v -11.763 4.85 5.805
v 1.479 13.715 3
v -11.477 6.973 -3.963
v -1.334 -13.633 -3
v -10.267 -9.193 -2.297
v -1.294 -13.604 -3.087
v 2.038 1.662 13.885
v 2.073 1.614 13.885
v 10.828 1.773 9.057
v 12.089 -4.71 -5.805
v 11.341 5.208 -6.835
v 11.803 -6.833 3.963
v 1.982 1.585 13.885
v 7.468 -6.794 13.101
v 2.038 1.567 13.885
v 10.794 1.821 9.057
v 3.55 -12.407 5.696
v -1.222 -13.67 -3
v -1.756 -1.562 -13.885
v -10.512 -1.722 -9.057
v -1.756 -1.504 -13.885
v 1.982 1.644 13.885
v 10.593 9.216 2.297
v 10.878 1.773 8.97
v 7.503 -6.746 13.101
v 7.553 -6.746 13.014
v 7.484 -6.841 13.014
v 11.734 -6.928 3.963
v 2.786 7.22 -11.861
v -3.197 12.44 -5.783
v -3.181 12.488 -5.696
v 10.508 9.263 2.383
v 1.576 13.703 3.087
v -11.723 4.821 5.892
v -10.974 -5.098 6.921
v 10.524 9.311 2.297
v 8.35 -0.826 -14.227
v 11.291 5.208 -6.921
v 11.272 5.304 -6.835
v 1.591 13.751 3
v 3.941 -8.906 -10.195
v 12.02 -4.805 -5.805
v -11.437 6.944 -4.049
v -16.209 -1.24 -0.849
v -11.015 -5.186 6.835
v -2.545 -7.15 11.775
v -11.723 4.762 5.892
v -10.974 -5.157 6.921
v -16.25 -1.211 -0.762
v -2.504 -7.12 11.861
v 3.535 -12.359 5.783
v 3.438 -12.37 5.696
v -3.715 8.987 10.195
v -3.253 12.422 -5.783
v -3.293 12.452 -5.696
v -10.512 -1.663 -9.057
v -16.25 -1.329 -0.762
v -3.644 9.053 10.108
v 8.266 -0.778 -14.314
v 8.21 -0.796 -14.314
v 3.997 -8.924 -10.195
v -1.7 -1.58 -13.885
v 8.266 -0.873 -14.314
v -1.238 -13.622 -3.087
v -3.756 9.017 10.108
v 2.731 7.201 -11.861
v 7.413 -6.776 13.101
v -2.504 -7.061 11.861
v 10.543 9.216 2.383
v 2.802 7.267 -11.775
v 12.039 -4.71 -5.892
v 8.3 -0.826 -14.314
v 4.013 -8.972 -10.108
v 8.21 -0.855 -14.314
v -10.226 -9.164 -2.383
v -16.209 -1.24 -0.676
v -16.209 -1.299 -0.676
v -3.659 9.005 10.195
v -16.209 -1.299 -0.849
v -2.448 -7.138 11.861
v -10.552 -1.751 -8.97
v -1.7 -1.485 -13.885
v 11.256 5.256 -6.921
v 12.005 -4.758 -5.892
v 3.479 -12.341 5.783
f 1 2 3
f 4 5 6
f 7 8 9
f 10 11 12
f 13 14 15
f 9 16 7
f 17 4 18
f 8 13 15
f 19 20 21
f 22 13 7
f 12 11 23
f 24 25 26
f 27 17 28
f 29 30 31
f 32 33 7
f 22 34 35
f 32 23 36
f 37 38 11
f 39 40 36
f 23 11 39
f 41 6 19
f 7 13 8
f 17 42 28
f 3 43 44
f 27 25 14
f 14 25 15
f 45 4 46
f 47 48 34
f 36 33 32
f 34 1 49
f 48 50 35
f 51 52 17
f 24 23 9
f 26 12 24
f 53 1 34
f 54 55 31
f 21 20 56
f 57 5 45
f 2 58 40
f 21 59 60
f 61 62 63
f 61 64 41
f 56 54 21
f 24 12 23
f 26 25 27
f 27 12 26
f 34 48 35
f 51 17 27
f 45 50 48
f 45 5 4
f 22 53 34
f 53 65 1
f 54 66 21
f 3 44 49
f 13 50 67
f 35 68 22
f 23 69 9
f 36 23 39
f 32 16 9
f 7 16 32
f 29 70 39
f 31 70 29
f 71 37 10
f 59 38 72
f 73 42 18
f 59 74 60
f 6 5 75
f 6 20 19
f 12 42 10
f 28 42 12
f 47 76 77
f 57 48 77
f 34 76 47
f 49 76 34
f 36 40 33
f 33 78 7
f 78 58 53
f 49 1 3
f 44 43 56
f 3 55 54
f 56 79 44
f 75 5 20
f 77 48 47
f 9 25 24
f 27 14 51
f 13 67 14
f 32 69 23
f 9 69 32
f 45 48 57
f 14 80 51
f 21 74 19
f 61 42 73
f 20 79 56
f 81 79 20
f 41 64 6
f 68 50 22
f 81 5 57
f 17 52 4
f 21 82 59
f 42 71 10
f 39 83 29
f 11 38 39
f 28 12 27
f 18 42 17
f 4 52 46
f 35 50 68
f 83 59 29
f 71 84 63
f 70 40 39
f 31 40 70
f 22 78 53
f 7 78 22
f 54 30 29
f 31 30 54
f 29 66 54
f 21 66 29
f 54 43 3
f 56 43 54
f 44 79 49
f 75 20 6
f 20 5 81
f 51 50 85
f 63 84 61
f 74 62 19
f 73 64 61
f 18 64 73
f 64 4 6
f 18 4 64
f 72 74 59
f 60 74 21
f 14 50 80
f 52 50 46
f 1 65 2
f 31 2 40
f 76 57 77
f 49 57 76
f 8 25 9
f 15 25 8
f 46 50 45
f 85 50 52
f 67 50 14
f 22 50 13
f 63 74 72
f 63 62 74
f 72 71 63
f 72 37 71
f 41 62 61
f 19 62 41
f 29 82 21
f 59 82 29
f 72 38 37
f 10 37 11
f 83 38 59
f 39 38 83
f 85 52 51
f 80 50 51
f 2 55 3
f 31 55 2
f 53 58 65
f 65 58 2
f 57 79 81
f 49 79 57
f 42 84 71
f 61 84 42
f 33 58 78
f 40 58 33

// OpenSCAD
// Auto-generated OpenSCAD file

    inner_points = 10*[[-0.12531678041950284, -1.3574519535518534, -0.3000260109199145], [-0.36746057341550314, 0.8957867730802842, 1.0108452987700864], [0.3981645779138779, -0.8876613539251546, -1.0108452987700864], [0.15602078491787758, 1.3655773727069829, 0.3000260109199145], [1.1703376344459069, -0.6833157024764185, 0.39628853077487575], [1.0778469356862532, 0.17734490632952513, 0.8969968161993667], [-1.0471429311878786, -0.16921948717439553, -0.8969968161993667], [-1.1396336299475323, 0.6914411216315481, -0.39628853077487575], [-0.2463928887078073, -0.7090848095102253, 1.1774700504213524], [1.1240990998859461, 0.520842947907666, -0.6834790050293927], [-1.0933950953875715, -0.5127175287525364, 0.6834790050293927], [0.277096893206182, 0.717210228665355, -1.1774700504213524], [0.3519124137141851, -1.2311593955032956, 0.5696305224586731], [0.20225931947783818, 0.16141872232289847, 1.379793546724183], [1.198923043974558, -0.47102223771210283, -0.5804992451419002], [1.0492699497382112, 0.9215558801140912, 0.2296637791236098], [-1.0185659452398366, -0.9134304609589615, -0.2296637791236098], [-1.1682190394761833, 0.4791476568672325, 0.5804992451419002], [-0.17155531497946344, -0.15329330316776887, -1.379793546724183], [-0.32120840921581034, 1.239284814658425, -0.5696305224586731], [0.7452968962209774, -0.6746243016514798, 1.3014210240601998], [-1.6168689194414103, -0.1269845502290076, -0.0762480675498447], [0.8250174408462159, -0.08256874217359109, -1.4226978450891705]];

    outer_points = 10*[[-0.4278051408840869, 1.2127161463312635, -0.5566217759152233], [-0.17380580954418245, -1.3719247336384077, -0.2261405699168037], [0.17380580954418245, 1.3719247336384077, 0.2261405699168037], [0.4278051408840869, -1.2127161463312635, 0.5566217759152233], [0.9893779464124436, 0.49362248371798856, -0.8608098595411191], [1.0863970578645408, -0.49362248371798856, -0.7345772714927785], [-1.0863970578645408, 0.49362248371798856, 0.7345772714927785], [-0.9893779464124436, -0.49362248371798856, 0.8608098595411191], [-0.3910812087944938, -0.20840674643547916, -1.3293410426713064], [1.1839567074308435, 0.20840674643547916, 0.7199573838305398], [-1.1839567074308435, -0.20840674643547916, -0.7199573838305398], [0.3910812087944938, 0.20840674643547916, 1.3293410426713064], [0.07624615997787965, 0.6698955034849399, -1.2283940854065145], [0.233226379865687, -0.9275004090487542, -1.0241454674564356], [1.0496731257749474, 0.9275004090487542, 0.038141995263304695], [1.2066533456627548, -0.6698955034849399, 0.24239061321338368], [-1.2066533456627548, 0.6698955034849399, -0.24239061321338368], [-1.0496731257749474, -0.9275004090487542, -0.038141995263304695], [-0.233226379865687, 0.9275004090487542, 1.0241454674564356], [-0.07624615997787965, -0.6698955034849399, 1.2283940854065145], [0.5871367924966472, -0.13720650167138226, -1.5243283937879823], [-1.624077516255638, -0.13720650167138226, 0.17515389348918065], [0.7552912676752325, 1.0728158516403192, 0.9827174256902117]];

    // Convex hull for inner set (I)
    module inner_hull() {
        hull() {
            for (p = inner_points) {
                translate(p) sphere(r=0.1);
            }
        }
    }

    // Convex hull for outer set (O) minus inner hull (O \ I)
    module outer_minus_inner() {
        difference() {
            hull() {
                for (p = outer_points) {
                    translate(p) sphere(r=0.1);
                }
            }
            inner_hull(); // Subtract inner hull
        }
    }

    // Convex hull for outer set (O) minus all translated inner hulls
    module outer_minus_AllTranslationInner() {
        difference() {
            hull() {
                for (p = outer_points) {
                    translate(p) sphere(r=0.1);
                }
            }
            hull() {
                translate([0,0,50]) inner_hull();
                translate([0,0,-50]) inner_hull();
            }; // Subtract translated inner hulls
        }
    }

    // Difference between outer_minus_inner and outer_minus_AllTranslationInner
    module outer_minus_inner_diff() {
        difference() {
            // Outer minus inner
            difference() {
                hull() {
                    for (p = outer_points) {
                        translate(p) sphere(r=0.1);
                    }
                }
                inner_hull();
            }

            // Subtract Outer minus AllTranslationInner
            difference() {
                hull() {
                    for (p = outer_points) {
                        translate(p) sphere(r=0.1);
                    }
                }
                hull() {
                    translate([0,0,50]) inner_hull();
                    translate([0,0,-50]) inner_hull();
                };
            }
        }
    }

    // Rendering all with colors applied
    color([1, 0, 0, 0.5]) inner_hull(); // Transparent red
    
